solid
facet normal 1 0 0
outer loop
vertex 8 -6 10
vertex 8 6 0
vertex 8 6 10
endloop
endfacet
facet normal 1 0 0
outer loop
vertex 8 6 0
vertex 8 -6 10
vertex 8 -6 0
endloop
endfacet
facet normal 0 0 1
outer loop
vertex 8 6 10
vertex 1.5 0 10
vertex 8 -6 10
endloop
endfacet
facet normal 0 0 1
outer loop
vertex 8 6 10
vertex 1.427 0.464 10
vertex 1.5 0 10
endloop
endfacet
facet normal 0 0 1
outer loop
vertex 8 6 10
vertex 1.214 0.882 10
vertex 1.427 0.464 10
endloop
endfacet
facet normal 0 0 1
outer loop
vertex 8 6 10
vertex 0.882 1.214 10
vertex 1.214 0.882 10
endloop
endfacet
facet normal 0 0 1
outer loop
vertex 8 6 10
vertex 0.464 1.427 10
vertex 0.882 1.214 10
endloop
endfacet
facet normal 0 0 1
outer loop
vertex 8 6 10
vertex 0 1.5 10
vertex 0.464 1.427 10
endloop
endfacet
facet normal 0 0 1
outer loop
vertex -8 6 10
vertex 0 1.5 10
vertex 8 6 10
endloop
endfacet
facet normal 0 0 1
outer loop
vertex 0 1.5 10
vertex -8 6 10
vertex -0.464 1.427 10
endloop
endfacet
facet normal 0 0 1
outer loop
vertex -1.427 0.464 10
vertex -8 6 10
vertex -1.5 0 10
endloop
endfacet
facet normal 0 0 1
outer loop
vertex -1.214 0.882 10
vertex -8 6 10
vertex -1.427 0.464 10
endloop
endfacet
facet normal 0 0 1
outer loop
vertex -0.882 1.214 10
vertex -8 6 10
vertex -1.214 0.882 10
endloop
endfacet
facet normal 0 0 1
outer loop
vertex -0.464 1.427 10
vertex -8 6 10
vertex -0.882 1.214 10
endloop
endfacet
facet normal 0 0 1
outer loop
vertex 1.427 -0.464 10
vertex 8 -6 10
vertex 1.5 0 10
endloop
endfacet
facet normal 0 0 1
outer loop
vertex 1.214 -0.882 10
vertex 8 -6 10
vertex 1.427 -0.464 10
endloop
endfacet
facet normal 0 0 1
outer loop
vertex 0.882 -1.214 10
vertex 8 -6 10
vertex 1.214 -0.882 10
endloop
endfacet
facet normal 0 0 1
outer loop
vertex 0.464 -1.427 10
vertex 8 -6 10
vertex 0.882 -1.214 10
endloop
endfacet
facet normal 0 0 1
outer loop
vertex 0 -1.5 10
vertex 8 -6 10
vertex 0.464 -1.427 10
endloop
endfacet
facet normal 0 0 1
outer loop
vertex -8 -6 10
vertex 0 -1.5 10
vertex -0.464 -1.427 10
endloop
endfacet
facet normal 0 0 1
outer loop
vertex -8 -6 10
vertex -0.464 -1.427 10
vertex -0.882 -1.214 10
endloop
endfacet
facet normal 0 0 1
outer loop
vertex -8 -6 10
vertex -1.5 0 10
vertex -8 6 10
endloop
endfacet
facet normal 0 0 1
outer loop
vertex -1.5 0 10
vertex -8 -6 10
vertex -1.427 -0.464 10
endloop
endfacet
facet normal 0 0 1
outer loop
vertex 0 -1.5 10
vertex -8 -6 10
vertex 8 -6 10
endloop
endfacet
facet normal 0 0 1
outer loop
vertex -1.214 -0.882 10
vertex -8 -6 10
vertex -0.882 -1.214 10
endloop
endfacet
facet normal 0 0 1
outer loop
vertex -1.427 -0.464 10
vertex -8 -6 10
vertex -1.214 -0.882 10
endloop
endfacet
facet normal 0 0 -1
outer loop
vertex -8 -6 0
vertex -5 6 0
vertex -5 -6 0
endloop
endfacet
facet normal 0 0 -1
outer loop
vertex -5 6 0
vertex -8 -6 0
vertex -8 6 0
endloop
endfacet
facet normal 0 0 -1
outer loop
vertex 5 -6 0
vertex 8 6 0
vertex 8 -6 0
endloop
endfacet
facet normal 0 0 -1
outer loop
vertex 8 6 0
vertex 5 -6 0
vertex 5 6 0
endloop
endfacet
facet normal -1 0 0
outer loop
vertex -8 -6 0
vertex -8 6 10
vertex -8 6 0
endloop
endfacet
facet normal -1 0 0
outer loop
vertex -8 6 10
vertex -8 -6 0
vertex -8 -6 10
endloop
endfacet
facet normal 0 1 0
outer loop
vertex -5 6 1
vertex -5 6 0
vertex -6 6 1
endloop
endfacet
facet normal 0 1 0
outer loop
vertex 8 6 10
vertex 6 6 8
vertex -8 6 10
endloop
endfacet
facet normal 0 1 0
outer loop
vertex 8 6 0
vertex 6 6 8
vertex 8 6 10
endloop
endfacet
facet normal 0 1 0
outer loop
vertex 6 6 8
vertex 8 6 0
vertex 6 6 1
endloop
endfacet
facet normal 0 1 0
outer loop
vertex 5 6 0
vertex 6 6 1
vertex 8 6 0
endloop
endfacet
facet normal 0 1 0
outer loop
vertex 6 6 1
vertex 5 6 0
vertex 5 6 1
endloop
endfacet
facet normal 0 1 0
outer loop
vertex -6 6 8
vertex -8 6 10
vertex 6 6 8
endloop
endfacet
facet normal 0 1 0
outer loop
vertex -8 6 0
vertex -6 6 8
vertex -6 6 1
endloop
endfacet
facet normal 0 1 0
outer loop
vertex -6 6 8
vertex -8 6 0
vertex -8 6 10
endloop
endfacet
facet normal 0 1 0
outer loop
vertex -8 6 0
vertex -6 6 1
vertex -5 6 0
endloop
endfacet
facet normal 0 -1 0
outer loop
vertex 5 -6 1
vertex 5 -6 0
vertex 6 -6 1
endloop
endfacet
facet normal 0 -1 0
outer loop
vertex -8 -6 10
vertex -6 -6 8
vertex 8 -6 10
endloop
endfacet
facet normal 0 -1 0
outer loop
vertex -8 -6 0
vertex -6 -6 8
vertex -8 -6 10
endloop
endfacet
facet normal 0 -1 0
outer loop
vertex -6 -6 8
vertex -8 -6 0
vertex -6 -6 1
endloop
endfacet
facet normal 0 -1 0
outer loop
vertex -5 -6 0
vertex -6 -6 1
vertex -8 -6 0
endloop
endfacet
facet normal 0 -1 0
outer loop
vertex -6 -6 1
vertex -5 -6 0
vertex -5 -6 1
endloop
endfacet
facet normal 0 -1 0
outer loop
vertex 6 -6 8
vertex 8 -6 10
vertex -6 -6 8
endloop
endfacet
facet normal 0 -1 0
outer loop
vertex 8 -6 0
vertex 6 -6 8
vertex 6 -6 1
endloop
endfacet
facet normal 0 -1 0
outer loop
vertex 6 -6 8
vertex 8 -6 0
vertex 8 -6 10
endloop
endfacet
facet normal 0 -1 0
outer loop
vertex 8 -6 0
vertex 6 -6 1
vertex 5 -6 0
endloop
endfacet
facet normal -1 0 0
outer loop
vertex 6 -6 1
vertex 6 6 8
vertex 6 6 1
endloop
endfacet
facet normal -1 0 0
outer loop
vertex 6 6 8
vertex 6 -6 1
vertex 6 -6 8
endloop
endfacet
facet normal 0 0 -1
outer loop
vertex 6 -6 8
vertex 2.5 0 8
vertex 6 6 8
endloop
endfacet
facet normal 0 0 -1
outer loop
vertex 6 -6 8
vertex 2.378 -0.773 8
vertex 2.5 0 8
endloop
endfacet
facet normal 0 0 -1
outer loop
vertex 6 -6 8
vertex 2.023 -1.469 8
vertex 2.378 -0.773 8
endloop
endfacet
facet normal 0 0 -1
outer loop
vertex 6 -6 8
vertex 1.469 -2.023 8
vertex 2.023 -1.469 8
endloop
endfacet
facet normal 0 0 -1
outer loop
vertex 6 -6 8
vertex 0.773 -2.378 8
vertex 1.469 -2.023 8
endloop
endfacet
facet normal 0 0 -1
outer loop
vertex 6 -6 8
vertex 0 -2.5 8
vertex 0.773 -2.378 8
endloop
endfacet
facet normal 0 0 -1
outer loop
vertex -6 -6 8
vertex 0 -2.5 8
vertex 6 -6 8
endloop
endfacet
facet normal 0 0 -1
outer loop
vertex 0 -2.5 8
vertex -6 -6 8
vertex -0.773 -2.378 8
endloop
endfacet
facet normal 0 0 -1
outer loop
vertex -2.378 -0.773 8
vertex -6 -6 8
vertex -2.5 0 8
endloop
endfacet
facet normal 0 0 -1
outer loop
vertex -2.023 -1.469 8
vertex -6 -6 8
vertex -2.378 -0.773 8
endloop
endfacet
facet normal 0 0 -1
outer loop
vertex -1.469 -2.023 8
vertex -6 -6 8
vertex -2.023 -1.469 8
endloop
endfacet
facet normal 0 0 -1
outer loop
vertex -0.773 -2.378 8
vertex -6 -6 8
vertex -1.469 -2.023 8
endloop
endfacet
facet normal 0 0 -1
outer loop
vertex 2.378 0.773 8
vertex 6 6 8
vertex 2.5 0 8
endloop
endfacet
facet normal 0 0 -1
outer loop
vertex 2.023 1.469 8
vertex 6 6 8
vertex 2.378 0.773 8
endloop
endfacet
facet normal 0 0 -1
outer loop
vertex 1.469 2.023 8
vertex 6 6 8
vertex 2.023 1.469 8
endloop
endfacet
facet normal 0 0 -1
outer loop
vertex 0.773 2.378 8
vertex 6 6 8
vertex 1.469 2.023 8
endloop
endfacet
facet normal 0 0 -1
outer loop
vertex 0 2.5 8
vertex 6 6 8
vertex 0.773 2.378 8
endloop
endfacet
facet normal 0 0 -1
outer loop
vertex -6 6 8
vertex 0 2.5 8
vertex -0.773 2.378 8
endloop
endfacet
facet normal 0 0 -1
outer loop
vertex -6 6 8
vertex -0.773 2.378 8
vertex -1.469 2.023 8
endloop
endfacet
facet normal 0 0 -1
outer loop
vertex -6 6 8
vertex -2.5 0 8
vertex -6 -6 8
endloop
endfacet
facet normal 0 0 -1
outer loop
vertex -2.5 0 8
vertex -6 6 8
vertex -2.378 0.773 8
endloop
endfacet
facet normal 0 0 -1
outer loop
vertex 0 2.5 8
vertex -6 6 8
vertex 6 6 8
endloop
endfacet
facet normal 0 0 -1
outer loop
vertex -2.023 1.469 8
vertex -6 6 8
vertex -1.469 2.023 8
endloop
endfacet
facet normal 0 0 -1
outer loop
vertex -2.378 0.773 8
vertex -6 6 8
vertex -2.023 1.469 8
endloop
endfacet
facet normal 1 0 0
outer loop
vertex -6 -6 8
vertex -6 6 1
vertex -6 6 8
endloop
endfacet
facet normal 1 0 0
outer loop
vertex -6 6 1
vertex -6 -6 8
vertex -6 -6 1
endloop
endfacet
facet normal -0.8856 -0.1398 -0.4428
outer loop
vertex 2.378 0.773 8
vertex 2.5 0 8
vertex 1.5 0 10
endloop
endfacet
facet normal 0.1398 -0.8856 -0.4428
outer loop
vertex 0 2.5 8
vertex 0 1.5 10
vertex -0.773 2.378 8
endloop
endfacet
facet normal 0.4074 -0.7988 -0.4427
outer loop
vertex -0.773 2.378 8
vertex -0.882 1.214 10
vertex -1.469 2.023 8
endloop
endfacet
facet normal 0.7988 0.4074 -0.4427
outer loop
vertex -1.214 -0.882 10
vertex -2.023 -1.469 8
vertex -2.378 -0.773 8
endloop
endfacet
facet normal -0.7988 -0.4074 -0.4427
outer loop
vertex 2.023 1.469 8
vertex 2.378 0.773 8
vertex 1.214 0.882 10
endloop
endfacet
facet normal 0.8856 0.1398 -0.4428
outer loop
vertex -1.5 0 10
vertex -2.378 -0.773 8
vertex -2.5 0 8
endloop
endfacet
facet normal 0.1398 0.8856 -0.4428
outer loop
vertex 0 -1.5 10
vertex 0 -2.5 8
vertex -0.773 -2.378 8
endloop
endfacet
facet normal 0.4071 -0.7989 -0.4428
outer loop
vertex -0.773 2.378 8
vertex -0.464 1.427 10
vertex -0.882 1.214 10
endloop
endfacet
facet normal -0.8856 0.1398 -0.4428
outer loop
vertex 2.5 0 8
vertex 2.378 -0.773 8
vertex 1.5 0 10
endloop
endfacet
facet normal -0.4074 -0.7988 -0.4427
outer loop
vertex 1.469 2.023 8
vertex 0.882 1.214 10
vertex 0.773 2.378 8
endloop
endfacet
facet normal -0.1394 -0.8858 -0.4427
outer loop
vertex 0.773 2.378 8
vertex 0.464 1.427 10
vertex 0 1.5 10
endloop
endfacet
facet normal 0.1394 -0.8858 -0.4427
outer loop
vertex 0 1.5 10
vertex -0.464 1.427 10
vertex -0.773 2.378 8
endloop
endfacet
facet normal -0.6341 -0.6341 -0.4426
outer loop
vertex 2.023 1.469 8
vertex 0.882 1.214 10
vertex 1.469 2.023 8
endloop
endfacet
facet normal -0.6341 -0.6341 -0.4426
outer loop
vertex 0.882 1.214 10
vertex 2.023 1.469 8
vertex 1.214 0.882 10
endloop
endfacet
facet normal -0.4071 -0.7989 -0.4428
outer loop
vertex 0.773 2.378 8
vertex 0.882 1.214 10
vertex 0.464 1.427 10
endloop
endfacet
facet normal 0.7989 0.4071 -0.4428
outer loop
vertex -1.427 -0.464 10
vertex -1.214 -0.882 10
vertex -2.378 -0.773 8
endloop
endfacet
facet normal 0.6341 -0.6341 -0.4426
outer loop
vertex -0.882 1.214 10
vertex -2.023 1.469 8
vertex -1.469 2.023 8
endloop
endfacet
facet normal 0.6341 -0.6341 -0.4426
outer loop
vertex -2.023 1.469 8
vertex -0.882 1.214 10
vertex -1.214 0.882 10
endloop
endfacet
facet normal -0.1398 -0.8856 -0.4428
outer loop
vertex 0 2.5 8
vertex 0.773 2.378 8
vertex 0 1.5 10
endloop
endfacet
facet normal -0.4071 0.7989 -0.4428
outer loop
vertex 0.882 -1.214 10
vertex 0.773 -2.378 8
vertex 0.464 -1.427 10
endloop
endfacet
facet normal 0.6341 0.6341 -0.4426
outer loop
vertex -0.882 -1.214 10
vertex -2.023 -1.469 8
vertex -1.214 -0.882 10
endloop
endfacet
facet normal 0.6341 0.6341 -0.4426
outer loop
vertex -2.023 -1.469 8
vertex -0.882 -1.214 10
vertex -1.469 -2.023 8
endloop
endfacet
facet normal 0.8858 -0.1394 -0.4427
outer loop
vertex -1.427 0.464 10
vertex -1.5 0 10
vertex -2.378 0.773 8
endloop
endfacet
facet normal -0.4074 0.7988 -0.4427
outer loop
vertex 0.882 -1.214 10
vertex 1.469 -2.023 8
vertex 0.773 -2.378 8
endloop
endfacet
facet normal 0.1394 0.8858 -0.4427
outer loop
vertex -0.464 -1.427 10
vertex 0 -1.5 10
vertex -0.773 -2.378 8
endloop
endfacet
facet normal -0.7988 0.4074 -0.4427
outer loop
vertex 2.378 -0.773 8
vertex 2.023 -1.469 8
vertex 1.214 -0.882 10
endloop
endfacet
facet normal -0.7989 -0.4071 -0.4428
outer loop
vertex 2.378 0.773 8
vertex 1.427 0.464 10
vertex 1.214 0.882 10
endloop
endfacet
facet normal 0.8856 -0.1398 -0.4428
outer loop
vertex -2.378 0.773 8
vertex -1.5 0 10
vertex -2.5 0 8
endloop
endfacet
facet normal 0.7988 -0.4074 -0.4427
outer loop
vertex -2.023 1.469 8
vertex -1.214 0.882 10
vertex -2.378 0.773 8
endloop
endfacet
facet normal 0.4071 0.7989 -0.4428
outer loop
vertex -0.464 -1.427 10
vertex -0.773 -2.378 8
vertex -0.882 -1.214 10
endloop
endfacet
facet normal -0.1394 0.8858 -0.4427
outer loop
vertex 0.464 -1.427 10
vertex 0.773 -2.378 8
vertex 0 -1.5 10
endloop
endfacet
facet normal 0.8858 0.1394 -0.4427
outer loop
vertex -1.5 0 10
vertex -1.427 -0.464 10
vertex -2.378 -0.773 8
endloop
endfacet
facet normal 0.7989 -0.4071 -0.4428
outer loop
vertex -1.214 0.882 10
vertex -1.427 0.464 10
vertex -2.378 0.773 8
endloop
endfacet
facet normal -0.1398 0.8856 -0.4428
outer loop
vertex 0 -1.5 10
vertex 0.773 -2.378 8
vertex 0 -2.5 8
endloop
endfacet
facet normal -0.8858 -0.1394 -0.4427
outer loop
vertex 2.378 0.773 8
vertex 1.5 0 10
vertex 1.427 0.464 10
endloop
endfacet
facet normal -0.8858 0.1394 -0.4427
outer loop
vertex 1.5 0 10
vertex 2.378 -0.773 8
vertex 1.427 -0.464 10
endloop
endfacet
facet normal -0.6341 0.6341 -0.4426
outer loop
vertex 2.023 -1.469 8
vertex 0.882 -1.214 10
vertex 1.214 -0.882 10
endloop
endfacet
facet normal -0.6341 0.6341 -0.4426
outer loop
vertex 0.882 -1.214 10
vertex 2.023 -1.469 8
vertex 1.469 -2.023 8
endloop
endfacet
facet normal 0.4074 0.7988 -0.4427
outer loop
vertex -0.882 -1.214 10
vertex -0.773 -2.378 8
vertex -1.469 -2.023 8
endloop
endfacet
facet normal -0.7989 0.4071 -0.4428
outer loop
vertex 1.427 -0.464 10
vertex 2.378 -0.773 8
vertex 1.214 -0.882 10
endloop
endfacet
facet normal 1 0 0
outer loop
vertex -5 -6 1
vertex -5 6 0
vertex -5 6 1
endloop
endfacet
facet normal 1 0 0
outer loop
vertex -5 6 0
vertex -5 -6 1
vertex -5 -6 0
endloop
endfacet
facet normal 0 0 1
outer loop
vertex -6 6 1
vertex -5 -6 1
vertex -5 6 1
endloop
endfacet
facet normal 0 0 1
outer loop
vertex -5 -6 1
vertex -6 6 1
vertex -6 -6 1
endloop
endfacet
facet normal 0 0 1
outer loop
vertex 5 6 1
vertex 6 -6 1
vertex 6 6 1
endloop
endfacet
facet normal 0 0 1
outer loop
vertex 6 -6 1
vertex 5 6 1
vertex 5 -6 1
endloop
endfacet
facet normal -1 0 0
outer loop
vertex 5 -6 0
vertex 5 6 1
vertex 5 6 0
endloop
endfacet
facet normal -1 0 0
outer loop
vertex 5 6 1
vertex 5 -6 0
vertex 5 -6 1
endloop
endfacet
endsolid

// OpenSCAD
module clamp() {
difference() {
    translate([0,0,5])
    cube([16,12,10], center=true);

    translate([0,0,4])
    cube([12,12,8],center=true);
    
}
}
union() {
difference() {
clamp();
    translate([0,0,8])
    #cylinder(d1=5, d2=3, $fn=20,h=2);
}

translate([-5.5,0,0.5])
cube([1,12,1],center=true);


translate([5.5,0,0.5])
cube([1,12,1],center=true);
}
